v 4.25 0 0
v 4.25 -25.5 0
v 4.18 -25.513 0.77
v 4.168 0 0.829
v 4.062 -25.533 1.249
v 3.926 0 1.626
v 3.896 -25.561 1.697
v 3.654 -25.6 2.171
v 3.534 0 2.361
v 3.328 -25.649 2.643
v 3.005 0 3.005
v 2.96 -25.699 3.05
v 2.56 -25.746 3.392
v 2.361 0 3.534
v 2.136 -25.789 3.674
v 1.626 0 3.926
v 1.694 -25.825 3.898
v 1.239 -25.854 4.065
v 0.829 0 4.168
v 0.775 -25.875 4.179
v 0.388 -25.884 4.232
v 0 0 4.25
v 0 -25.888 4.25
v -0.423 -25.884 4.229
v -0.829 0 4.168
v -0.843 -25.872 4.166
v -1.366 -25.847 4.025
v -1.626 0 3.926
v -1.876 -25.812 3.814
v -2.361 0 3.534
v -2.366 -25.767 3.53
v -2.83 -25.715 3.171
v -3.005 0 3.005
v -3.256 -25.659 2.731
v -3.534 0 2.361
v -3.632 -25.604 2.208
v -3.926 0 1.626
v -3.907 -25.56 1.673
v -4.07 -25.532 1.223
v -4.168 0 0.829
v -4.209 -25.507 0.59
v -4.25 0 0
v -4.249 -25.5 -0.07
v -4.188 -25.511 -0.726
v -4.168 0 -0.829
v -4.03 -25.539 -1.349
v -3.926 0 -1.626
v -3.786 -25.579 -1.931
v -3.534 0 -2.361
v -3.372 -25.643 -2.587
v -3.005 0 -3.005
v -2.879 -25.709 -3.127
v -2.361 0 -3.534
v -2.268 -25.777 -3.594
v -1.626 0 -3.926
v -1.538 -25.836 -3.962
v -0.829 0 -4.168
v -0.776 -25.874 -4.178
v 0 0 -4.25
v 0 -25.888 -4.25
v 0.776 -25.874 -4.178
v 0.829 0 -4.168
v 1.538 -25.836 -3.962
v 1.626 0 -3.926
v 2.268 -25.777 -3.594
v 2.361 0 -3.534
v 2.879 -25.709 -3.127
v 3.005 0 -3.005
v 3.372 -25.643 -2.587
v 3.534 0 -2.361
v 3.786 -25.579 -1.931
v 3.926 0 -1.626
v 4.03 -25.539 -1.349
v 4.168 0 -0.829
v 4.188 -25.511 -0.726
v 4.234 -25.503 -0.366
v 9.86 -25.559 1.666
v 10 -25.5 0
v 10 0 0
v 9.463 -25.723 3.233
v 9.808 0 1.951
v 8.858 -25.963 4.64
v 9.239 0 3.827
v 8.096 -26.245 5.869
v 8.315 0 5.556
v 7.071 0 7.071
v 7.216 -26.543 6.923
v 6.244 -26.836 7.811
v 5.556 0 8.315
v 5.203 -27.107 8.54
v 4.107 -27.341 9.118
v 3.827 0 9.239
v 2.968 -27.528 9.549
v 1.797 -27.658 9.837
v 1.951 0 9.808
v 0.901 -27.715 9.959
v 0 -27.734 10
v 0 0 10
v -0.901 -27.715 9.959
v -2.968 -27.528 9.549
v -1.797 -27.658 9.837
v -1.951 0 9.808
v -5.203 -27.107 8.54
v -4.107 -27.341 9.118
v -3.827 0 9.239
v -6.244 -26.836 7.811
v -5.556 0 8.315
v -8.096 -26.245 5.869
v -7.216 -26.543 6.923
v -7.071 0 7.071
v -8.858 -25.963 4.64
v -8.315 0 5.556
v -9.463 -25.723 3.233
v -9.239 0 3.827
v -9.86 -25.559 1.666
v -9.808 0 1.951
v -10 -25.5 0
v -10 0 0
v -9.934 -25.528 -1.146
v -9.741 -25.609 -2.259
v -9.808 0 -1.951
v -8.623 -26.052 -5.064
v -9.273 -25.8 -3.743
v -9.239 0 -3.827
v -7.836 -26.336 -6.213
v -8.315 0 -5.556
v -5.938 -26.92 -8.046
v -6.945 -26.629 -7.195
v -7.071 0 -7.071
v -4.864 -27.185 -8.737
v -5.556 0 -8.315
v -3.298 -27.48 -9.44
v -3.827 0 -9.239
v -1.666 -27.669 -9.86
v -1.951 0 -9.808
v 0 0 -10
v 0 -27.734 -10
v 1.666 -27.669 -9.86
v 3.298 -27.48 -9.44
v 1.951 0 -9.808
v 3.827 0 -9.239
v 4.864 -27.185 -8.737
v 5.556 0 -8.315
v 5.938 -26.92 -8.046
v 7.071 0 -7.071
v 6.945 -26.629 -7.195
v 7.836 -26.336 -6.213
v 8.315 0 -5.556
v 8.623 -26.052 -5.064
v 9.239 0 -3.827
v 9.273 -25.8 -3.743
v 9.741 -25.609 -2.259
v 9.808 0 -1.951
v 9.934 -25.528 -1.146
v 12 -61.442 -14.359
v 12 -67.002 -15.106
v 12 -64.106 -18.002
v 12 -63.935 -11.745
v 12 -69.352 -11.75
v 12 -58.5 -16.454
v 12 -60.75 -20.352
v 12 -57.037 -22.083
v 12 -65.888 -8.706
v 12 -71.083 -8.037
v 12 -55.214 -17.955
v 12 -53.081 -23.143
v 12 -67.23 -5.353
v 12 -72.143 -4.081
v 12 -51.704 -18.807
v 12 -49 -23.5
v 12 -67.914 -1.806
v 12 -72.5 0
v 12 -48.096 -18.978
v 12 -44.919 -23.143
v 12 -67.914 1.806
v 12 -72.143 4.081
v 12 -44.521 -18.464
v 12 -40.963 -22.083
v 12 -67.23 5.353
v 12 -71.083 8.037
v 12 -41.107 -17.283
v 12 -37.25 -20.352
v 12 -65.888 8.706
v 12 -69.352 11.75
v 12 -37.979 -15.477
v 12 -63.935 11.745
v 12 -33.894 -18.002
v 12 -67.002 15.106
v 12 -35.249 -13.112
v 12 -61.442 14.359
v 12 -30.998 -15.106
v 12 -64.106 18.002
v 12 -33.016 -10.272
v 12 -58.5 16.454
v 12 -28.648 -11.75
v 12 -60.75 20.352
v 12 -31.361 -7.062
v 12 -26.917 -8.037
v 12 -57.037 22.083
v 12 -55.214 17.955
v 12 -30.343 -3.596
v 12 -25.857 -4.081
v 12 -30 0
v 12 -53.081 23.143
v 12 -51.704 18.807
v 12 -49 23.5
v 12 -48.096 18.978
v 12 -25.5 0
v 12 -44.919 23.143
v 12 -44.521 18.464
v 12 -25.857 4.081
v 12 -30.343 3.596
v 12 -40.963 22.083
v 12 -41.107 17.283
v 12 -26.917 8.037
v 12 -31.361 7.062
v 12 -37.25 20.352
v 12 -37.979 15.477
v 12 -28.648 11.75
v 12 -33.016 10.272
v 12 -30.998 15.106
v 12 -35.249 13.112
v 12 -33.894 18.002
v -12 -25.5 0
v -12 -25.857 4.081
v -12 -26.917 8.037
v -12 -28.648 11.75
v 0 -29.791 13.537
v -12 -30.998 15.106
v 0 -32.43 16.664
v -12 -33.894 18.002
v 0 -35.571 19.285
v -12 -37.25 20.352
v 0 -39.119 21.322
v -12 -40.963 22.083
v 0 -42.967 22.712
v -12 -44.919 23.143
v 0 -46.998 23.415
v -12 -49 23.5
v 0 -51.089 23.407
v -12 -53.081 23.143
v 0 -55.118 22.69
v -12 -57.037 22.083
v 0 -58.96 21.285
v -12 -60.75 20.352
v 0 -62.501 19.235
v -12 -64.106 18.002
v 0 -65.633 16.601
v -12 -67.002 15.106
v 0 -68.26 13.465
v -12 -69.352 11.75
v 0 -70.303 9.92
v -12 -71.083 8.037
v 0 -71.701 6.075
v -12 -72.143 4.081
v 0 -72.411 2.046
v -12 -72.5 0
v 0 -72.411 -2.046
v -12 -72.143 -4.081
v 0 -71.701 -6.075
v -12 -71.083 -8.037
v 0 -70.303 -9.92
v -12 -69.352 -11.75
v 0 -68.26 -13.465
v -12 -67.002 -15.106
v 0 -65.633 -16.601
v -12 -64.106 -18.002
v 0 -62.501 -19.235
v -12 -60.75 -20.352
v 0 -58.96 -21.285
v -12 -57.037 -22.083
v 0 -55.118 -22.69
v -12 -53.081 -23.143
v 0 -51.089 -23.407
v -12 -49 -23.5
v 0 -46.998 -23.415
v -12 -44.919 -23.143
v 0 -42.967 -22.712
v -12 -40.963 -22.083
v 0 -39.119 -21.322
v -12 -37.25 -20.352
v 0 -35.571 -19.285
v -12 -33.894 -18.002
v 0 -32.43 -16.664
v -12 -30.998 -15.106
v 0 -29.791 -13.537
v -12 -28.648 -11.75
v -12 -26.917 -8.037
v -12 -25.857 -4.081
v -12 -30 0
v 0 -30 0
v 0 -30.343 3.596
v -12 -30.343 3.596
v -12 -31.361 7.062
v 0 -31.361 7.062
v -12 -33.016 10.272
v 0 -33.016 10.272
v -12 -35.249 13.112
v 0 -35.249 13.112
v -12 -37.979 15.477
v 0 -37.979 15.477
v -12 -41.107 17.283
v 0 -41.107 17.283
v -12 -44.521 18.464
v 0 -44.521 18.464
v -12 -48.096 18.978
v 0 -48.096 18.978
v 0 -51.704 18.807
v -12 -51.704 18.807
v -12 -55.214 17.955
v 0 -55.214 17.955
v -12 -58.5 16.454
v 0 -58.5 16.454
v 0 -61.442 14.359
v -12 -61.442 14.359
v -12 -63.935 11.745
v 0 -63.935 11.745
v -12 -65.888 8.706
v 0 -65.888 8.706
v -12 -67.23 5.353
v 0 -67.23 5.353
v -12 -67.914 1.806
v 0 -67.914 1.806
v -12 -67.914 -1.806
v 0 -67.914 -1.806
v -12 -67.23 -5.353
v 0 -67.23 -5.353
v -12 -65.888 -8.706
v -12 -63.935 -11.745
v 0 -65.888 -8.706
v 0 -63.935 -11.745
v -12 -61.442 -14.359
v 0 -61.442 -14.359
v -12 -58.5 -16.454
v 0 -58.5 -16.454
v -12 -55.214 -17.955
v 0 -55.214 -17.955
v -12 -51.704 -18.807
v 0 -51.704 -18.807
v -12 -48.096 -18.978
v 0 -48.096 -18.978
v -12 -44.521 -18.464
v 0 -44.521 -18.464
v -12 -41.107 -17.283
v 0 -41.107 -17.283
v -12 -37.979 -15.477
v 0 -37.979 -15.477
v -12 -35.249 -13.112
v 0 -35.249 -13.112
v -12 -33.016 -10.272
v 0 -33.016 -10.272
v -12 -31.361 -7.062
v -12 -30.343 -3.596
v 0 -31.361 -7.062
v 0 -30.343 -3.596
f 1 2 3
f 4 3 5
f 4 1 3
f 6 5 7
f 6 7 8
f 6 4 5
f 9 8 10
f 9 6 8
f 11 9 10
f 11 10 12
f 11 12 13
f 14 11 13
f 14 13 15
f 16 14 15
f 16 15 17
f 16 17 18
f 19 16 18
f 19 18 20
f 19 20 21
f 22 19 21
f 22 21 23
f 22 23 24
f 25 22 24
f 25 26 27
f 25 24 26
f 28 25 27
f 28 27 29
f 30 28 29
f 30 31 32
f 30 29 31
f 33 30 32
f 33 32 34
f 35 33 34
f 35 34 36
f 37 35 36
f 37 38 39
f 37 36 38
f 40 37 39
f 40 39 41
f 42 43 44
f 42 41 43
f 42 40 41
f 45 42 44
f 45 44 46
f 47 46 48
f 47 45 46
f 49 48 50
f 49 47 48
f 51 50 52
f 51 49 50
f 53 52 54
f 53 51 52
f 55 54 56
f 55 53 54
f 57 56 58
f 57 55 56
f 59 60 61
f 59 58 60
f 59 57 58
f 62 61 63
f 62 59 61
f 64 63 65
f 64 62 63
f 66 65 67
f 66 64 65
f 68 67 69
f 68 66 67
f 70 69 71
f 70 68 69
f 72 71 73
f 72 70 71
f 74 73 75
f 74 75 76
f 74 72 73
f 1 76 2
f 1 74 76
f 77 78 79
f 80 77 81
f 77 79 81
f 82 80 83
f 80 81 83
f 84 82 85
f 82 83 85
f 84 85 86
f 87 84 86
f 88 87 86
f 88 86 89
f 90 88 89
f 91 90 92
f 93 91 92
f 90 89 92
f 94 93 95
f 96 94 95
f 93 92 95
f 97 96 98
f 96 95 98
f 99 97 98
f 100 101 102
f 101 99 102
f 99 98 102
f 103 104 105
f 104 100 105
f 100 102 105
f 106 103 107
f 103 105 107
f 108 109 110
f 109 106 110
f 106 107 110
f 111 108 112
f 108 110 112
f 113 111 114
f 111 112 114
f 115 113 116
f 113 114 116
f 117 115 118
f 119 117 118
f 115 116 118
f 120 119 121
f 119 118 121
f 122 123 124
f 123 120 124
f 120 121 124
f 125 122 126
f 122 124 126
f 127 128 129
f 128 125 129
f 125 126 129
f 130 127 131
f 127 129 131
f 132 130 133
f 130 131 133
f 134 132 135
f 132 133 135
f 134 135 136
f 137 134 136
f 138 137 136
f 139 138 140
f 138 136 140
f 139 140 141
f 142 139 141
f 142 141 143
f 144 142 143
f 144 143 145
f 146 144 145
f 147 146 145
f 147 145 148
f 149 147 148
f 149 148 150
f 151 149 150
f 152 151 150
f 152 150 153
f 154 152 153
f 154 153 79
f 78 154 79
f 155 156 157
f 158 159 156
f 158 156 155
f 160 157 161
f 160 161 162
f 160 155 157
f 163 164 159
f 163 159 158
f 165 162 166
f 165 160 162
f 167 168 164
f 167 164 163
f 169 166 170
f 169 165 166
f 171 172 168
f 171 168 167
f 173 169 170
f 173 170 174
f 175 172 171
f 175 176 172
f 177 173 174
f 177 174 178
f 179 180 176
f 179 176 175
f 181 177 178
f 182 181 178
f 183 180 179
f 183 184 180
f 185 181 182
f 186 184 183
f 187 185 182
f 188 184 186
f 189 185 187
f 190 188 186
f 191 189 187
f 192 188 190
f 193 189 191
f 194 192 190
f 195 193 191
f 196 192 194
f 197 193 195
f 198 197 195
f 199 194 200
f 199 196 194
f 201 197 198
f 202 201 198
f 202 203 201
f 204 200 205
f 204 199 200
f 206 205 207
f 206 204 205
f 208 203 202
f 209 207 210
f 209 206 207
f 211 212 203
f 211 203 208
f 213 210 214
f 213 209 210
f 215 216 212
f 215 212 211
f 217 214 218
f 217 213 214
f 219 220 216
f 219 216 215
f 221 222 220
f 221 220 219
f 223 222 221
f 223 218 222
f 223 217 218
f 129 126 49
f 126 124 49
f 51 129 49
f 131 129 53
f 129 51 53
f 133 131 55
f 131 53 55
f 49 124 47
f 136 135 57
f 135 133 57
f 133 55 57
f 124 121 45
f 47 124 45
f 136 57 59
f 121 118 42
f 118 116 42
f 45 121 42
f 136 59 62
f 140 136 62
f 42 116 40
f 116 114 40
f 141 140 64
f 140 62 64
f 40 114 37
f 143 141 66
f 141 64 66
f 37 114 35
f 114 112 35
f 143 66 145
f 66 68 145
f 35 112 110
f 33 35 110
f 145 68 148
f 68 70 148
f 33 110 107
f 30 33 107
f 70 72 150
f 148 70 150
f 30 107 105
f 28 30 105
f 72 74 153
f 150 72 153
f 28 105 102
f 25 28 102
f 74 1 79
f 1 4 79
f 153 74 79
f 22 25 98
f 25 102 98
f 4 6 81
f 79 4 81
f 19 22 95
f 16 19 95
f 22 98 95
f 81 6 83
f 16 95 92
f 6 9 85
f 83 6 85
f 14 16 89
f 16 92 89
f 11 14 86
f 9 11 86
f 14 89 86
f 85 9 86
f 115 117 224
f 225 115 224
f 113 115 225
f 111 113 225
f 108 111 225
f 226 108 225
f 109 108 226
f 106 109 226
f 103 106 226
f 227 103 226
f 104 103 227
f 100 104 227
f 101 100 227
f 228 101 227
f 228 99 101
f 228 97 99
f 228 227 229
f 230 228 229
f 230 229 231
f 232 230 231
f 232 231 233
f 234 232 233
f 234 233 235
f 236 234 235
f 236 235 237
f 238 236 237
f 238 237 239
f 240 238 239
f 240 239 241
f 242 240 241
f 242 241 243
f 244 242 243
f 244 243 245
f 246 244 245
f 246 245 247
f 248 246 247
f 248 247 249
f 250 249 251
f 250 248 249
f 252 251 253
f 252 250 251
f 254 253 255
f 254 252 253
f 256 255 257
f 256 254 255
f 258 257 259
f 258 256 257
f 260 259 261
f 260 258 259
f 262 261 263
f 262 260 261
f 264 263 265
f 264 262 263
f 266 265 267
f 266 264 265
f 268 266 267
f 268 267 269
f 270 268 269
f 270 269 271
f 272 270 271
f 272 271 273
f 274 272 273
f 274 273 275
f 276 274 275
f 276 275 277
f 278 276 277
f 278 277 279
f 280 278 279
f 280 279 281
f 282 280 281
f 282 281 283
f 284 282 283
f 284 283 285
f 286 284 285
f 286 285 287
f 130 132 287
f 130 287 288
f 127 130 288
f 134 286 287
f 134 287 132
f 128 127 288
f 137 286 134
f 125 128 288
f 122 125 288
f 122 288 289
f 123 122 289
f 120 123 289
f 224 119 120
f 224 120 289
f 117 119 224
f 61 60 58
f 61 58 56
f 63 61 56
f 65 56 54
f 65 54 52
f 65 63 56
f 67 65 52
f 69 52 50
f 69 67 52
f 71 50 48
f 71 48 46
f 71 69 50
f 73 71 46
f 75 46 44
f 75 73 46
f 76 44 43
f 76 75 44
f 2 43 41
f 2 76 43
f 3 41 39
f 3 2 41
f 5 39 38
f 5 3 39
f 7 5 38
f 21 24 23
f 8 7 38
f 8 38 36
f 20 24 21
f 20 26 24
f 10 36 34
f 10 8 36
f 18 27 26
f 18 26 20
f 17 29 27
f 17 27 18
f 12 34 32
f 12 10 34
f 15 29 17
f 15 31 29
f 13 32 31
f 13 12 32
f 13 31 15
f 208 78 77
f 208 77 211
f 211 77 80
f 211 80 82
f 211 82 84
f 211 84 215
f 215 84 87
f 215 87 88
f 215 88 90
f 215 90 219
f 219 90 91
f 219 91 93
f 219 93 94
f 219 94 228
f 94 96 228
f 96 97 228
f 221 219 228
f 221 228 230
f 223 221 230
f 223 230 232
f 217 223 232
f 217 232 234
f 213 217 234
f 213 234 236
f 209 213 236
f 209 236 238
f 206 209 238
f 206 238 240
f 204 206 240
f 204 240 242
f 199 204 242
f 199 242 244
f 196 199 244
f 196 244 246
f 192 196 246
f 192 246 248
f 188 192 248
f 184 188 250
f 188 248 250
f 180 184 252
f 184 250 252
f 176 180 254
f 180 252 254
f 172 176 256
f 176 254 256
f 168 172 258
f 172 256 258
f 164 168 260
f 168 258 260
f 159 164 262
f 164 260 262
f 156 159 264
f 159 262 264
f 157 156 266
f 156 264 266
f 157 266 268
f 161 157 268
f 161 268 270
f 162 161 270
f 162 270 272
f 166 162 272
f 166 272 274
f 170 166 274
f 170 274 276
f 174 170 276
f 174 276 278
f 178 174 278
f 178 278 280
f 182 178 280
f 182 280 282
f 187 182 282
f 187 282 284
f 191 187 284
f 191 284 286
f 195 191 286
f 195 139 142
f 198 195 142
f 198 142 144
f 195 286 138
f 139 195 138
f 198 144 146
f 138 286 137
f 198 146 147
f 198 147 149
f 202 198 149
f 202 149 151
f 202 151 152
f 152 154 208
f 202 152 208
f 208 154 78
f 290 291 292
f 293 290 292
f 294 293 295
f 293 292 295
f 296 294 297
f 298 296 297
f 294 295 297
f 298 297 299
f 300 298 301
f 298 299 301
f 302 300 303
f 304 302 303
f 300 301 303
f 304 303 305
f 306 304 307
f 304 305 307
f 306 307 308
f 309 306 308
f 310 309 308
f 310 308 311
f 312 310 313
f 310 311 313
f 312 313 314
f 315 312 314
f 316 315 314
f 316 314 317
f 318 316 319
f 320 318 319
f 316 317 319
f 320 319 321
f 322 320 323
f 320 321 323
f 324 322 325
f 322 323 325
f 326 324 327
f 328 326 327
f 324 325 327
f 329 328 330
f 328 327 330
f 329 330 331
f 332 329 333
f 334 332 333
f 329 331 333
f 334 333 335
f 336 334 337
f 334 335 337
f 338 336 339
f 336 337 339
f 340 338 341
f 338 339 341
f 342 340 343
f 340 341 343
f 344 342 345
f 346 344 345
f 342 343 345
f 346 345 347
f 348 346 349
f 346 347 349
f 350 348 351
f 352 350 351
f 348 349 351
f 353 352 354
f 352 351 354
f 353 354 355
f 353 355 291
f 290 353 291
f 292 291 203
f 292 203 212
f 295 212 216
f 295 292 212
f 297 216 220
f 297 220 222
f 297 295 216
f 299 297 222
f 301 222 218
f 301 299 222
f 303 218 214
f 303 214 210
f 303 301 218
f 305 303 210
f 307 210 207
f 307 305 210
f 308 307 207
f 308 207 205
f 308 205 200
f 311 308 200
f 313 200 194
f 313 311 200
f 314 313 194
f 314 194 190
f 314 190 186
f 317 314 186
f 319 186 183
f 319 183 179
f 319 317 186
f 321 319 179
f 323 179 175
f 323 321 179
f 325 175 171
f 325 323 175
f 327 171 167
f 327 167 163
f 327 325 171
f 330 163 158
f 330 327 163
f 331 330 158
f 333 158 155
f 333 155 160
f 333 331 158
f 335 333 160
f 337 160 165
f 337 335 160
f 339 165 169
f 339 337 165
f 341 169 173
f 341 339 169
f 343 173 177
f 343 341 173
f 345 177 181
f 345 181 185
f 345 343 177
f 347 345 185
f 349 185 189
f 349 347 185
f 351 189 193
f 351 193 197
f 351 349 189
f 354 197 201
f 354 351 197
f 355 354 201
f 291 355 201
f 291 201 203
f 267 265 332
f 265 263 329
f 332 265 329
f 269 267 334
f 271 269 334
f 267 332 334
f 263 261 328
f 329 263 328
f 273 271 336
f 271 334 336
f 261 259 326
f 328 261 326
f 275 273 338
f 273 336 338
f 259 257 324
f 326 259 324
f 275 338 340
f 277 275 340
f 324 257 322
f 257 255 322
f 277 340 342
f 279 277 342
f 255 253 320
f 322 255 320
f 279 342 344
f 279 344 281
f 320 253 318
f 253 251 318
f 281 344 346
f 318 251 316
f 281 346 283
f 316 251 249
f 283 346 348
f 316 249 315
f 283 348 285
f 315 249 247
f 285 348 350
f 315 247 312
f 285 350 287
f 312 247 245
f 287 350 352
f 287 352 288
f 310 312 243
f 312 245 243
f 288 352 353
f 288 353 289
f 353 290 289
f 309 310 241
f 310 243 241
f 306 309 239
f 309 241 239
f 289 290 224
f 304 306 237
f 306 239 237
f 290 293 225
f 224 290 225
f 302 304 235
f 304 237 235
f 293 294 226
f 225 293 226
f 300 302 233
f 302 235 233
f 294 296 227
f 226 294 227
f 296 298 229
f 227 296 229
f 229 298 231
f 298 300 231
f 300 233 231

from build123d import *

# Parameters (mm, degrees)
F0_R     = 10
F0_R_2   = 4.25
F1_DEPTH = 30
F2_R     = 23.5
F2_R_2   = 19
F3_DEPTH = 12


with BuildPart() as f1:
    # F0 (on Front) → F1 (new body)
    with BuildSketch(Plane.XZ):
        Circle(F0_R)
        Circle(F0_R_2, mode=Mode.SUBTRACT)
    extrude(amount=F1_DEPTH)

    # F2 (on Right) → F3 (join)
    with BuildSketch(Plane.YZ):
        with Locations((-49, 0)):
            Circle(F2_R)
        with Locations((-49, 0)):
            Circle(F2_R_2, mode=Mode.SUBTRACT)
    extrude(amount=F3_DEPTH)

    # F4: F1 across plane


with BuildPart() as f1_1:
    add(f1.part)
    add(f1.part.mirror(Plane.YZ))


solid = f1_1.part
